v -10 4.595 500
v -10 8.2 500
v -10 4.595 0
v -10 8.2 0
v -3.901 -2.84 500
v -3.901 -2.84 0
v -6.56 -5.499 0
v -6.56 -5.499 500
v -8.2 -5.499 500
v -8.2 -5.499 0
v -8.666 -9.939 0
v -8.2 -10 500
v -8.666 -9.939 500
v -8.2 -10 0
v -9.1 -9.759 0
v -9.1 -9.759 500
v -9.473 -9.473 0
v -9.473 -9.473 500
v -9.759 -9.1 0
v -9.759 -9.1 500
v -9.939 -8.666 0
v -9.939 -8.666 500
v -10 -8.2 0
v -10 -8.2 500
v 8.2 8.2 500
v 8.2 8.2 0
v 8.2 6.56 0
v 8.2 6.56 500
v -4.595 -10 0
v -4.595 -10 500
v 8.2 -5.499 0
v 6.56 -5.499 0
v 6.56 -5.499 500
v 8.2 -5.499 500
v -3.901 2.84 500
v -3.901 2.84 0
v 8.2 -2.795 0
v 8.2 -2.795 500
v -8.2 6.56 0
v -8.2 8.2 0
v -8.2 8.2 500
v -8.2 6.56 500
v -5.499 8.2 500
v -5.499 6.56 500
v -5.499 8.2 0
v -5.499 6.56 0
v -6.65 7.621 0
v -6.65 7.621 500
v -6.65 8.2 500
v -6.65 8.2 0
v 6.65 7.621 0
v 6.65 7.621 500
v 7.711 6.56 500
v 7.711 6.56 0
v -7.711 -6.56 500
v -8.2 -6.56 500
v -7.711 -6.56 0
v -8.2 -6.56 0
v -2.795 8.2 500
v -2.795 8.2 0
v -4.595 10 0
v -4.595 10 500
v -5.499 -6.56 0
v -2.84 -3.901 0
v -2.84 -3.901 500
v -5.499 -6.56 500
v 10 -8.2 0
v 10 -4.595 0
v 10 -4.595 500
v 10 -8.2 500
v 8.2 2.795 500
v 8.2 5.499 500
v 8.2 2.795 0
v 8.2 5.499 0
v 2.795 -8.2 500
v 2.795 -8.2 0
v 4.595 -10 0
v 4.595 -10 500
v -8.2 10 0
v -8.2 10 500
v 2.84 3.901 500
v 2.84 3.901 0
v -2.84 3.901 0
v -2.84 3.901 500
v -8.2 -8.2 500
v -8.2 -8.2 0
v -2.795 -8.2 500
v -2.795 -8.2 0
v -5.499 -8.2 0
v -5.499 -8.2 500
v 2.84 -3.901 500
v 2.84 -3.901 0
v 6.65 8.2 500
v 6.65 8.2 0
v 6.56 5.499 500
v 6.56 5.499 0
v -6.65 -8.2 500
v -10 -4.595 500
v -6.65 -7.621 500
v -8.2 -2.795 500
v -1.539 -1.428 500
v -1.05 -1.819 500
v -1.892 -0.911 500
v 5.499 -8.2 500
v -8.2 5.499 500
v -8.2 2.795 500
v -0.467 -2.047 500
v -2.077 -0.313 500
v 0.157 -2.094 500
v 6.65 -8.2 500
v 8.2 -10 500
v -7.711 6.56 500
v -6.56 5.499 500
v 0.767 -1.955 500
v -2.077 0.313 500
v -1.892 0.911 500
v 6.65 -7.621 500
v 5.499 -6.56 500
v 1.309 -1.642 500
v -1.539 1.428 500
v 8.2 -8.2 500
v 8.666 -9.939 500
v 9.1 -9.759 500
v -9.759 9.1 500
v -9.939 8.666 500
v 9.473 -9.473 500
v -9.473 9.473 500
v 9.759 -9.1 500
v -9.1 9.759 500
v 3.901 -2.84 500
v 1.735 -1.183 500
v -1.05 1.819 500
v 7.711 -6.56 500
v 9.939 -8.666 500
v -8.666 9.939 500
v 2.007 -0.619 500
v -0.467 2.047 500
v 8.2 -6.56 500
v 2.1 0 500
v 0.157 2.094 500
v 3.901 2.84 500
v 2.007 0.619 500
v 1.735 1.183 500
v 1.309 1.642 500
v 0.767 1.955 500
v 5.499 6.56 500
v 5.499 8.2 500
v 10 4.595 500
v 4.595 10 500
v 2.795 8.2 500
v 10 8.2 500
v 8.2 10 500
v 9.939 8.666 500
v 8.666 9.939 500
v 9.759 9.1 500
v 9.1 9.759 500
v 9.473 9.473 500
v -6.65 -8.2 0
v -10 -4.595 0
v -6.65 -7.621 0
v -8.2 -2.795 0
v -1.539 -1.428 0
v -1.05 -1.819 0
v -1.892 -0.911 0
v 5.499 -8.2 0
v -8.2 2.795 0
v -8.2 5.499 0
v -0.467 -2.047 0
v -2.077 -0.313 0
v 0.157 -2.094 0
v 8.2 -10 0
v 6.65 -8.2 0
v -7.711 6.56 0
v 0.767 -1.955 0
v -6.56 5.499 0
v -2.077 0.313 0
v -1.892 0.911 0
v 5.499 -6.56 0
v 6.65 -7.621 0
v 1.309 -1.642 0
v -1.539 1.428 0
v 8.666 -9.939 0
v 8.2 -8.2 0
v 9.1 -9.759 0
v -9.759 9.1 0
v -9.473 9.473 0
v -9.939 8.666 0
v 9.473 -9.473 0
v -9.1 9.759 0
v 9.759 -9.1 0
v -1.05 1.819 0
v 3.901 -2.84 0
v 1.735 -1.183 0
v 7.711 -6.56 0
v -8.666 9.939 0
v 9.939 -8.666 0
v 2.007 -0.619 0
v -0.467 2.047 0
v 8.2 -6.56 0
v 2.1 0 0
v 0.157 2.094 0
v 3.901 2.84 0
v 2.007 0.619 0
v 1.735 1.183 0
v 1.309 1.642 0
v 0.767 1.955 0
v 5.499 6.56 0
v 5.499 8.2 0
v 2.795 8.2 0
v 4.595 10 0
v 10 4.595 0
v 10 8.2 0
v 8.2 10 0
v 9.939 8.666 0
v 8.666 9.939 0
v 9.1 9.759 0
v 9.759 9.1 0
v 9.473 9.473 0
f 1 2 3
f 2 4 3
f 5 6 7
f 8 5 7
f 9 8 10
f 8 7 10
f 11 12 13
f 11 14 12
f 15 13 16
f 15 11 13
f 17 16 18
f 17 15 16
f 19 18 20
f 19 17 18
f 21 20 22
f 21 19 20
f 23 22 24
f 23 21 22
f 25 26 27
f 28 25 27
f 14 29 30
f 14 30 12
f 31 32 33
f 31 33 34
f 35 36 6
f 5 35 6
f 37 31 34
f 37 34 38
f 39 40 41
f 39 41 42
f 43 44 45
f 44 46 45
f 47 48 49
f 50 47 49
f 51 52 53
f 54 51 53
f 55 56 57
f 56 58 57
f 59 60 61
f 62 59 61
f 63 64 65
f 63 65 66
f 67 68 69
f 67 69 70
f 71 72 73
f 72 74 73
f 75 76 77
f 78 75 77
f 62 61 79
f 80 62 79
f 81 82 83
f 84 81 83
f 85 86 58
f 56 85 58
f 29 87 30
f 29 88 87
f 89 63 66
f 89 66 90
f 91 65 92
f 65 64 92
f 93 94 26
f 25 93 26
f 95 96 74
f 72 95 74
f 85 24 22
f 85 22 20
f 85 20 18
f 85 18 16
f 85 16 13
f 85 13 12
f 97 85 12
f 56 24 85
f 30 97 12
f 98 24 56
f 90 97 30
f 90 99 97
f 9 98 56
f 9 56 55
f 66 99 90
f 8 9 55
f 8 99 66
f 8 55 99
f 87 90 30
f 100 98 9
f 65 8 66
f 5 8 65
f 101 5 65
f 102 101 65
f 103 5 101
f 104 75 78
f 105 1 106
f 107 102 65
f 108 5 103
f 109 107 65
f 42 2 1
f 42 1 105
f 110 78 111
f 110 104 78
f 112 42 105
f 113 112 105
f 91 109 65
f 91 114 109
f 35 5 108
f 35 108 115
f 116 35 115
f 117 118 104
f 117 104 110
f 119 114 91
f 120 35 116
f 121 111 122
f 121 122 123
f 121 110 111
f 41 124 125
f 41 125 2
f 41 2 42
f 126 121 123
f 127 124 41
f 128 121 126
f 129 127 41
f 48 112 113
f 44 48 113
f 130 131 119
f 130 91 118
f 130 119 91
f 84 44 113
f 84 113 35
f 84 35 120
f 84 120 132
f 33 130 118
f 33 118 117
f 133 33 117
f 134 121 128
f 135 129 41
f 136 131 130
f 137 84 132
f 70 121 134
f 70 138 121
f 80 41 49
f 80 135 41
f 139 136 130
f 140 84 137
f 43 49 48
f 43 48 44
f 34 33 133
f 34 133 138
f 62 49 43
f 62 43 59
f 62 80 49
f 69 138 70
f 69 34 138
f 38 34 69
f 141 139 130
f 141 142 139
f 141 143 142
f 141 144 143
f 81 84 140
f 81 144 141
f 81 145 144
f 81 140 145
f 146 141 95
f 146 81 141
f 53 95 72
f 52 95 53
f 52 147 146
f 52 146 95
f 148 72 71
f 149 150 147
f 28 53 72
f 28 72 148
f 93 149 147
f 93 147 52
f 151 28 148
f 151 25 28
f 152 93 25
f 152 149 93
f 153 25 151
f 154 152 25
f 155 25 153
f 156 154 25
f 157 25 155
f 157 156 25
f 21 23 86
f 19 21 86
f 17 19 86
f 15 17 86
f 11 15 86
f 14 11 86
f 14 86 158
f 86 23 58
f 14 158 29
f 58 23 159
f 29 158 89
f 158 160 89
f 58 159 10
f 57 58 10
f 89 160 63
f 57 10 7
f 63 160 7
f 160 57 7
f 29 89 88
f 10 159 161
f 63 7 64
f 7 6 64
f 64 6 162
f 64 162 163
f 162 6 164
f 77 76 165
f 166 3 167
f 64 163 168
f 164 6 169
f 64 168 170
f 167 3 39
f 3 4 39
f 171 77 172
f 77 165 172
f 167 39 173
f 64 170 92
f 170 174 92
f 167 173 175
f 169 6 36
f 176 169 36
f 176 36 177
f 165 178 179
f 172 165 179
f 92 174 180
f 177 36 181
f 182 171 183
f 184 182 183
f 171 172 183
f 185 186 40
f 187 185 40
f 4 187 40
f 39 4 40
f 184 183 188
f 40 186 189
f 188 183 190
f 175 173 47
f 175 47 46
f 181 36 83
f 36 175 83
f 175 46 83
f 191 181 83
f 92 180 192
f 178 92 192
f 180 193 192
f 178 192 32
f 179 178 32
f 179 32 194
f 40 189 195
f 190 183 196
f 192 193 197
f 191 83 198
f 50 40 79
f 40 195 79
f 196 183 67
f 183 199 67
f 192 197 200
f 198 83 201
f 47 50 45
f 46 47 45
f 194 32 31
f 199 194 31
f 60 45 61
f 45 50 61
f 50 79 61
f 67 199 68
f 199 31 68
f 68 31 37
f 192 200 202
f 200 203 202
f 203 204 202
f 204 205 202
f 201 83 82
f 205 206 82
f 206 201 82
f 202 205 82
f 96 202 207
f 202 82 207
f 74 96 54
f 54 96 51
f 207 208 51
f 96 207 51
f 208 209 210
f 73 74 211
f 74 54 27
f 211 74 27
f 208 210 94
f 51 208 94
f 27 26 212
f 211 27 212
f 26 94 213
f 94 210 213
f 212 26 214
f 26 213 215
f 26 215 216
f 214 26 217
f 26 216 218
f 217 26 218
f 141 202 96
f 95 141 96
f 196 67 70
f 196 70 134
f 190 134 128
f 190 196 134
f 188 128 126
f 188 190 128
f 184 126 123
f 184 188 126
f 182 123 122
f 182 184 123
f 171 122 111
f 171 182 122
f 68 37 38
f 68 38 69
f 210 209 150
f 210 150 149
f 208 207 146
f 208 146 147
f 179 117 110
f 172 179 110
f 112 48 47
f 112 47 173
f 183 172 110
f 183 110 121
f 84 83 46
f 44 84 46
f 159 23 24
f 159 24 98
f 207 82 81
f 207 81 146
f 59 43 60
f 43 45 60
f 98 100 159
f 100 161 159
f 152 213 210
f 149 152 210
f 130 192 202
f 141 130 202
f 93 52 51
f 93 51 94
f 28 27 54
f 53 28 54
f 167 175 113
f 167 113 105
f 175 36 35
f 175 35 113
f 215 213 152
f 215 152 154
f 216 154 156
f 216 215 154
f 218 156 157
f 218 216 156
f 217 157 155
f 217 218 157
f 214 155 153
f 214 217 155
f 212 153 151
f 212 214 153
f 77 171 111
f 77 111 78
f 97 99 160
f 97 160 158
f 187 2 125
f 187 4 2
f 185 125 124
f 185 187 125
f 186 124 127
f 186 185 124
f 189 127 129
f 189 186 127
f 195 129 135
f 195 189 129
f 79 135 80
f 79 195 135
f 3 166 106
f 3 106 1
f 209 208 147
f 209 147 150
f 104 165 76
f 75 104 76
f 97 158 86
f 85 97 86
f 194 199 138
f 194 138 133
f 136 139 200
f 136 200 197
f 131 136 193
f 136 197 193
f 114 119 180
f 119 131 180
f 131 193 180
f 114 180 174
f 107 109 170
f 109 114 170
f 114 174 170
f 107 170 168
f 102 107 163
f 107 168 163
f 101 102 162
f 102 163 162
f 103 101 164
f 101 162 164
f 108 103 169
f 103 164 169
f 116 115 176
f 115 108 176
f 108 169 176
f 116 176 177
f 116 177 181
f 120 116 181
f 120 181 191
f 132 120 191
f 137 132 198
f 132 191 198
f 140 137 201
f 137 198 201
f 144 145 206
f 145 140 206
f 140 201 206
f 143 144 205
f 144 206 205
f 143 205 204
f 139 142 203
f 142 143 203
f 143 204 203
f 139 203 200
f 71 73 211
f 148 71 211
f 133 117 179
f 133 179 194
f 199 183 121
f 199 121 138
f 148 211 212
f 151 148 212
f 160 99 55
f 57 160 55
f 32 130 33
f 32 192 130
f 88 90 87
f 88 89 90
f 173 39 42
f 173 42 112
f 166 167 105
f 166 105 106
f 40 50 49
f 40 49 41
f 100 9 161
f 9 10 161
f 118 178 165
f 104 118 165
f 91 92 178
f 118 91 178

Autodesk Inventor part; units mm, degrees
ref_plane "YZ Plane" through (0, 0, 0) normal (1, 0, 0) x (0, 1, 0)
ref_plane "Start Plane" through (0, 0, 0) normal (0, 0, 1) x (1, 0, 0)
ref_plane "End Plane" through (0, 0, 20) normal (0, 0, 1) x (1, 0, 0)
sketch "Sketch1" plane through (0, 0, 0) normal (0, 0, 1) x (1, 0, 0)
  line L0 (10, -4.5951) -> (10, -8.2)
  line L1 (-10, -8.2) -> (-10, -4.5951)
  line L2 (-10, 10) -> (10, -10) construction
  line L3 (10, 10) -> (-10, -10) construction
  circle A0 centre (0, 0) radius 2.1
  line L4 (-2.84, -3.9007) -> (2.84, -3.9007)
  line L5 (3.9007, -2.84) -> (3.9007, 2.84)
  line L6 (2.84, 3.9007) -> (-2.84, 3.9007)
  line L7 (-3.9007, 2.84) -> (-3.9007, -2.84)
  line L8 (-3.9007, -3.9007) -> (3.9007, 3.9007) construction
  line L9 (3.9007, -3.9007) -> (-3.9007, 3.9007) construction
  line L10 (-3.9007, -2.84) -> (-2.84, -3.9007) construction
  line L11 (-2.84, -3.9007) -> (-5.4993, -6.56)
  line L12 (-5.4993, -6.56) -> (-5.4993, -8.2)
  line L13 (-5.4993, -8.2) -> (-2.7951, -8.2)
  line L14 (-2.7951, -8.2) -> (-4.5951, -10)
  line L15 (0, 0) -> (0, -3.9007) construction
  line L16 (3.9007, -2.84) -> (2.84, -3.9007) construction
  line L17 (2.84, -3.9007) -> (5.4993, -6.56)
  line L18 (5.4993, -6.56) -> (5.4993, -8.2)
  line L19 (5.4993, -8.2) -> (2.7951, -8.2)
  line L20 (2.7951, -8.2) -> (4.5951, -10)
  line L21 (-2.84, -3.9007) -> (-3.9007, -2.84) construction
  line L22 (-3.9007, -2.84) -> (-6.56, -5.4993)
  line L23 (-6.56, -5.4993) -> (-8.2, -5.4993)
  line L24 (-8.2, -5.4993) -> (-8.2, -2.7951)
  line L25 (-8.2, -2.7951) -> (-10, -4.5951)
  line L26 (3.9007, -2.84) -> (6.56, -5.4993)
  line L27 (6.56, -5.4993) -> (8.2, -5.4993)
  line L28 (8.2, -5.4993) -> (8.2, -2.7951)
  line L29 (8.2, -2.7951) -> (10, -4.5951)
  arc A1 (-10, -8.2) -> (-8.2, -10) centre (-8.2, -8.2) ccw
  arc A2 (8.2, -10) -> (10, -8.2) centre (8.2, -8.2) ccw
  line L30 (-8.2, -6.56) -> (-7.7111, -6.56)
  line L31 (-6.6505, -8.2) -> (-8.2, -8.2)
  line L32 (-8.2, -8.2) -> (-8.2, -6.56)
  line L33 (-6.6505, -7.6207) -> (-7.7111, -6.56)
  line L34 (-6.6505, -7.6207) -> (-6.6505, -8.2)
  line L35 (8.2, -6.56) -> (7.7111, -6.56)
  line L36 (6.6505, -8.2) -> (8.2, -8.2)
  line L37 (8.2, -8.2) -> (8.2, -6.56)
  line L38 (6.6505, -7.6207) -> (7.7111, -6.56)
  line L39 (6.6505, -7.6207) -> (6.6505, -8.2)
  line L40 (8.2, -10) -> (4.5951, -10)
  line L41 (-4.5951, -10) -> (-8.2, -10)
  line L42 (-3.9007, 0) -> (3.9007, 0) construction
  line L43 (10, 4.5951) -> (10, 8.2)
  line L44 (-10, 8.2) -> (-10, 4.5951)
  line L45 (-2.84, 3.9007) -> (2.84, 3.9007)
  line L46 (-3.9007, 2.84) -> (-2.84, 3.9007) construction
  line L47 (-2.84, 3.9007) -> (-5.4993, 6.56)
  line L48 (-5.4993, 6.56) -> (-5.4993, 8.2)
  line L49 (-5.4993, 8.2) -> (-2.7951, 8.2)
  line L50 (-2.7951, 8.2) -> (-4.5951, 10)
  line L51 (2.84, 3.9007) -> (5.4993, 6.56)
  line L52 (5.4993, 6.56) -> (5.4993, 8.2)
  line L53 (5.4993, 8.2) -> (2.7951, 8.2)
  line L54 (2.7951, 8.2) -> (4.5951, 10)
  line L55 (3.9007, 2.84) -> (2.84, 3.9007) construction
  line L56 (-8.2, 2.7951) -> (-10, 4.5951)
  line L57 (-2.84, 3.9007) -> (-3.9007, 2.84) construction
  line L58 (-3.9007, 2.84) -> (-6.56, 5.4993)
  line L59 (-6.56, 5.4993) -> (-8.2, 5.4993)
  line L60 (-8.2, 5.4993) -> (-8.2, 2.7951)
  line L61 (3.9007, 2.84) -> (6.56, 5.4993)
  line L62 (6.56, 5.4993) -> (8.2, 5.4993)
  line L63 (8.2, 5.4993) -> (8.2, 2.7951)
  line L64 (8.2, 2.7951) -> (10, 4.5951)
  arc A3 (-8.2, 10) -> (-10, 8.2) centre (-8.2, 8.2) ccw
  arc A4 (10, 8.2) -> (8.2, 10) centre (8.2, 8.2) ccw
  line L65 (-8.2, 6.56) -> (-7.7111, 6.56)
  line L66 (-6.6505, 8.2) -> (-8.2, 8.2)
  line L67 (-8.2, 8.2) -> (-8.2, 6.56)
  line L68 (-6.6505, 7.6207) -> (-7.7111, 6.56)
  line L69 (-6.6505, 7.6207) -> (-6.6505, 8.2)
  line L70 (8.2, 6.56) -> (7.7111, 6.56)
  line L71 (6.6505, 7.6207) -> (7.7111, 6.56)
  line L72 (8.2, 8.2) -> (8.2, 6.56)
  line L73 (6.6505, 7.6207) -> (6.6505, 8.2)
  line L74 (6.6505, 8.2) -> (8.2, 8.2)
  line L75 (8.2, 10) -> (4.5951, 10)
  line L76 (-4.5951, 10) -> (-8.2, 10)
  line L77 (-8.2, 10) -> (-4.5951, 10)
  line L78 (4.5951, 10) -> (8.2, 10)
  point P0 (8.2, -8.2)
  point P1 (0, 3.9007)
  point P2 (8.2, 8.2)
  dimension "Width" = 20
  dimension "Height" = 20
  dimension "d2" = 4.2
  dimension "d3" = 1.5
  dimension "d4" = 1.64
  dimension "d6" = 5.68
  dimension "d7" = 1.8
  dimension "d9" = 1.5
extrude "Body" add sketch "Sketch1" along normal blind 500
sketch "Sketch4" plane through (0, 0, 0) normal (0, 0, 1) x (1, 0, 0)
  line L0 (0, 0) -> (10, 0)
ref_plane "Work Plane4" through (0, 0, 0) normal (0, -1, 0) x (1, 0, 0)
sketch "Sketch5" plane through (0, 0, 0) normal (0, -1, 0) x (1, 0, 0)
  line L0 (-2, 0) -> (12, 0) construction
  line L1 (-2, 20) -> (12, 20) construction
  dimension "d17" = 20
equation "\"G_OFFSET_START\" = 0"
equation "\"G_OFFSET_END\" = 0"
equation "\"G_L\" = d17"
properties part number "V-slot 20 mm x 20 mm" material "Aluminum 6061"
